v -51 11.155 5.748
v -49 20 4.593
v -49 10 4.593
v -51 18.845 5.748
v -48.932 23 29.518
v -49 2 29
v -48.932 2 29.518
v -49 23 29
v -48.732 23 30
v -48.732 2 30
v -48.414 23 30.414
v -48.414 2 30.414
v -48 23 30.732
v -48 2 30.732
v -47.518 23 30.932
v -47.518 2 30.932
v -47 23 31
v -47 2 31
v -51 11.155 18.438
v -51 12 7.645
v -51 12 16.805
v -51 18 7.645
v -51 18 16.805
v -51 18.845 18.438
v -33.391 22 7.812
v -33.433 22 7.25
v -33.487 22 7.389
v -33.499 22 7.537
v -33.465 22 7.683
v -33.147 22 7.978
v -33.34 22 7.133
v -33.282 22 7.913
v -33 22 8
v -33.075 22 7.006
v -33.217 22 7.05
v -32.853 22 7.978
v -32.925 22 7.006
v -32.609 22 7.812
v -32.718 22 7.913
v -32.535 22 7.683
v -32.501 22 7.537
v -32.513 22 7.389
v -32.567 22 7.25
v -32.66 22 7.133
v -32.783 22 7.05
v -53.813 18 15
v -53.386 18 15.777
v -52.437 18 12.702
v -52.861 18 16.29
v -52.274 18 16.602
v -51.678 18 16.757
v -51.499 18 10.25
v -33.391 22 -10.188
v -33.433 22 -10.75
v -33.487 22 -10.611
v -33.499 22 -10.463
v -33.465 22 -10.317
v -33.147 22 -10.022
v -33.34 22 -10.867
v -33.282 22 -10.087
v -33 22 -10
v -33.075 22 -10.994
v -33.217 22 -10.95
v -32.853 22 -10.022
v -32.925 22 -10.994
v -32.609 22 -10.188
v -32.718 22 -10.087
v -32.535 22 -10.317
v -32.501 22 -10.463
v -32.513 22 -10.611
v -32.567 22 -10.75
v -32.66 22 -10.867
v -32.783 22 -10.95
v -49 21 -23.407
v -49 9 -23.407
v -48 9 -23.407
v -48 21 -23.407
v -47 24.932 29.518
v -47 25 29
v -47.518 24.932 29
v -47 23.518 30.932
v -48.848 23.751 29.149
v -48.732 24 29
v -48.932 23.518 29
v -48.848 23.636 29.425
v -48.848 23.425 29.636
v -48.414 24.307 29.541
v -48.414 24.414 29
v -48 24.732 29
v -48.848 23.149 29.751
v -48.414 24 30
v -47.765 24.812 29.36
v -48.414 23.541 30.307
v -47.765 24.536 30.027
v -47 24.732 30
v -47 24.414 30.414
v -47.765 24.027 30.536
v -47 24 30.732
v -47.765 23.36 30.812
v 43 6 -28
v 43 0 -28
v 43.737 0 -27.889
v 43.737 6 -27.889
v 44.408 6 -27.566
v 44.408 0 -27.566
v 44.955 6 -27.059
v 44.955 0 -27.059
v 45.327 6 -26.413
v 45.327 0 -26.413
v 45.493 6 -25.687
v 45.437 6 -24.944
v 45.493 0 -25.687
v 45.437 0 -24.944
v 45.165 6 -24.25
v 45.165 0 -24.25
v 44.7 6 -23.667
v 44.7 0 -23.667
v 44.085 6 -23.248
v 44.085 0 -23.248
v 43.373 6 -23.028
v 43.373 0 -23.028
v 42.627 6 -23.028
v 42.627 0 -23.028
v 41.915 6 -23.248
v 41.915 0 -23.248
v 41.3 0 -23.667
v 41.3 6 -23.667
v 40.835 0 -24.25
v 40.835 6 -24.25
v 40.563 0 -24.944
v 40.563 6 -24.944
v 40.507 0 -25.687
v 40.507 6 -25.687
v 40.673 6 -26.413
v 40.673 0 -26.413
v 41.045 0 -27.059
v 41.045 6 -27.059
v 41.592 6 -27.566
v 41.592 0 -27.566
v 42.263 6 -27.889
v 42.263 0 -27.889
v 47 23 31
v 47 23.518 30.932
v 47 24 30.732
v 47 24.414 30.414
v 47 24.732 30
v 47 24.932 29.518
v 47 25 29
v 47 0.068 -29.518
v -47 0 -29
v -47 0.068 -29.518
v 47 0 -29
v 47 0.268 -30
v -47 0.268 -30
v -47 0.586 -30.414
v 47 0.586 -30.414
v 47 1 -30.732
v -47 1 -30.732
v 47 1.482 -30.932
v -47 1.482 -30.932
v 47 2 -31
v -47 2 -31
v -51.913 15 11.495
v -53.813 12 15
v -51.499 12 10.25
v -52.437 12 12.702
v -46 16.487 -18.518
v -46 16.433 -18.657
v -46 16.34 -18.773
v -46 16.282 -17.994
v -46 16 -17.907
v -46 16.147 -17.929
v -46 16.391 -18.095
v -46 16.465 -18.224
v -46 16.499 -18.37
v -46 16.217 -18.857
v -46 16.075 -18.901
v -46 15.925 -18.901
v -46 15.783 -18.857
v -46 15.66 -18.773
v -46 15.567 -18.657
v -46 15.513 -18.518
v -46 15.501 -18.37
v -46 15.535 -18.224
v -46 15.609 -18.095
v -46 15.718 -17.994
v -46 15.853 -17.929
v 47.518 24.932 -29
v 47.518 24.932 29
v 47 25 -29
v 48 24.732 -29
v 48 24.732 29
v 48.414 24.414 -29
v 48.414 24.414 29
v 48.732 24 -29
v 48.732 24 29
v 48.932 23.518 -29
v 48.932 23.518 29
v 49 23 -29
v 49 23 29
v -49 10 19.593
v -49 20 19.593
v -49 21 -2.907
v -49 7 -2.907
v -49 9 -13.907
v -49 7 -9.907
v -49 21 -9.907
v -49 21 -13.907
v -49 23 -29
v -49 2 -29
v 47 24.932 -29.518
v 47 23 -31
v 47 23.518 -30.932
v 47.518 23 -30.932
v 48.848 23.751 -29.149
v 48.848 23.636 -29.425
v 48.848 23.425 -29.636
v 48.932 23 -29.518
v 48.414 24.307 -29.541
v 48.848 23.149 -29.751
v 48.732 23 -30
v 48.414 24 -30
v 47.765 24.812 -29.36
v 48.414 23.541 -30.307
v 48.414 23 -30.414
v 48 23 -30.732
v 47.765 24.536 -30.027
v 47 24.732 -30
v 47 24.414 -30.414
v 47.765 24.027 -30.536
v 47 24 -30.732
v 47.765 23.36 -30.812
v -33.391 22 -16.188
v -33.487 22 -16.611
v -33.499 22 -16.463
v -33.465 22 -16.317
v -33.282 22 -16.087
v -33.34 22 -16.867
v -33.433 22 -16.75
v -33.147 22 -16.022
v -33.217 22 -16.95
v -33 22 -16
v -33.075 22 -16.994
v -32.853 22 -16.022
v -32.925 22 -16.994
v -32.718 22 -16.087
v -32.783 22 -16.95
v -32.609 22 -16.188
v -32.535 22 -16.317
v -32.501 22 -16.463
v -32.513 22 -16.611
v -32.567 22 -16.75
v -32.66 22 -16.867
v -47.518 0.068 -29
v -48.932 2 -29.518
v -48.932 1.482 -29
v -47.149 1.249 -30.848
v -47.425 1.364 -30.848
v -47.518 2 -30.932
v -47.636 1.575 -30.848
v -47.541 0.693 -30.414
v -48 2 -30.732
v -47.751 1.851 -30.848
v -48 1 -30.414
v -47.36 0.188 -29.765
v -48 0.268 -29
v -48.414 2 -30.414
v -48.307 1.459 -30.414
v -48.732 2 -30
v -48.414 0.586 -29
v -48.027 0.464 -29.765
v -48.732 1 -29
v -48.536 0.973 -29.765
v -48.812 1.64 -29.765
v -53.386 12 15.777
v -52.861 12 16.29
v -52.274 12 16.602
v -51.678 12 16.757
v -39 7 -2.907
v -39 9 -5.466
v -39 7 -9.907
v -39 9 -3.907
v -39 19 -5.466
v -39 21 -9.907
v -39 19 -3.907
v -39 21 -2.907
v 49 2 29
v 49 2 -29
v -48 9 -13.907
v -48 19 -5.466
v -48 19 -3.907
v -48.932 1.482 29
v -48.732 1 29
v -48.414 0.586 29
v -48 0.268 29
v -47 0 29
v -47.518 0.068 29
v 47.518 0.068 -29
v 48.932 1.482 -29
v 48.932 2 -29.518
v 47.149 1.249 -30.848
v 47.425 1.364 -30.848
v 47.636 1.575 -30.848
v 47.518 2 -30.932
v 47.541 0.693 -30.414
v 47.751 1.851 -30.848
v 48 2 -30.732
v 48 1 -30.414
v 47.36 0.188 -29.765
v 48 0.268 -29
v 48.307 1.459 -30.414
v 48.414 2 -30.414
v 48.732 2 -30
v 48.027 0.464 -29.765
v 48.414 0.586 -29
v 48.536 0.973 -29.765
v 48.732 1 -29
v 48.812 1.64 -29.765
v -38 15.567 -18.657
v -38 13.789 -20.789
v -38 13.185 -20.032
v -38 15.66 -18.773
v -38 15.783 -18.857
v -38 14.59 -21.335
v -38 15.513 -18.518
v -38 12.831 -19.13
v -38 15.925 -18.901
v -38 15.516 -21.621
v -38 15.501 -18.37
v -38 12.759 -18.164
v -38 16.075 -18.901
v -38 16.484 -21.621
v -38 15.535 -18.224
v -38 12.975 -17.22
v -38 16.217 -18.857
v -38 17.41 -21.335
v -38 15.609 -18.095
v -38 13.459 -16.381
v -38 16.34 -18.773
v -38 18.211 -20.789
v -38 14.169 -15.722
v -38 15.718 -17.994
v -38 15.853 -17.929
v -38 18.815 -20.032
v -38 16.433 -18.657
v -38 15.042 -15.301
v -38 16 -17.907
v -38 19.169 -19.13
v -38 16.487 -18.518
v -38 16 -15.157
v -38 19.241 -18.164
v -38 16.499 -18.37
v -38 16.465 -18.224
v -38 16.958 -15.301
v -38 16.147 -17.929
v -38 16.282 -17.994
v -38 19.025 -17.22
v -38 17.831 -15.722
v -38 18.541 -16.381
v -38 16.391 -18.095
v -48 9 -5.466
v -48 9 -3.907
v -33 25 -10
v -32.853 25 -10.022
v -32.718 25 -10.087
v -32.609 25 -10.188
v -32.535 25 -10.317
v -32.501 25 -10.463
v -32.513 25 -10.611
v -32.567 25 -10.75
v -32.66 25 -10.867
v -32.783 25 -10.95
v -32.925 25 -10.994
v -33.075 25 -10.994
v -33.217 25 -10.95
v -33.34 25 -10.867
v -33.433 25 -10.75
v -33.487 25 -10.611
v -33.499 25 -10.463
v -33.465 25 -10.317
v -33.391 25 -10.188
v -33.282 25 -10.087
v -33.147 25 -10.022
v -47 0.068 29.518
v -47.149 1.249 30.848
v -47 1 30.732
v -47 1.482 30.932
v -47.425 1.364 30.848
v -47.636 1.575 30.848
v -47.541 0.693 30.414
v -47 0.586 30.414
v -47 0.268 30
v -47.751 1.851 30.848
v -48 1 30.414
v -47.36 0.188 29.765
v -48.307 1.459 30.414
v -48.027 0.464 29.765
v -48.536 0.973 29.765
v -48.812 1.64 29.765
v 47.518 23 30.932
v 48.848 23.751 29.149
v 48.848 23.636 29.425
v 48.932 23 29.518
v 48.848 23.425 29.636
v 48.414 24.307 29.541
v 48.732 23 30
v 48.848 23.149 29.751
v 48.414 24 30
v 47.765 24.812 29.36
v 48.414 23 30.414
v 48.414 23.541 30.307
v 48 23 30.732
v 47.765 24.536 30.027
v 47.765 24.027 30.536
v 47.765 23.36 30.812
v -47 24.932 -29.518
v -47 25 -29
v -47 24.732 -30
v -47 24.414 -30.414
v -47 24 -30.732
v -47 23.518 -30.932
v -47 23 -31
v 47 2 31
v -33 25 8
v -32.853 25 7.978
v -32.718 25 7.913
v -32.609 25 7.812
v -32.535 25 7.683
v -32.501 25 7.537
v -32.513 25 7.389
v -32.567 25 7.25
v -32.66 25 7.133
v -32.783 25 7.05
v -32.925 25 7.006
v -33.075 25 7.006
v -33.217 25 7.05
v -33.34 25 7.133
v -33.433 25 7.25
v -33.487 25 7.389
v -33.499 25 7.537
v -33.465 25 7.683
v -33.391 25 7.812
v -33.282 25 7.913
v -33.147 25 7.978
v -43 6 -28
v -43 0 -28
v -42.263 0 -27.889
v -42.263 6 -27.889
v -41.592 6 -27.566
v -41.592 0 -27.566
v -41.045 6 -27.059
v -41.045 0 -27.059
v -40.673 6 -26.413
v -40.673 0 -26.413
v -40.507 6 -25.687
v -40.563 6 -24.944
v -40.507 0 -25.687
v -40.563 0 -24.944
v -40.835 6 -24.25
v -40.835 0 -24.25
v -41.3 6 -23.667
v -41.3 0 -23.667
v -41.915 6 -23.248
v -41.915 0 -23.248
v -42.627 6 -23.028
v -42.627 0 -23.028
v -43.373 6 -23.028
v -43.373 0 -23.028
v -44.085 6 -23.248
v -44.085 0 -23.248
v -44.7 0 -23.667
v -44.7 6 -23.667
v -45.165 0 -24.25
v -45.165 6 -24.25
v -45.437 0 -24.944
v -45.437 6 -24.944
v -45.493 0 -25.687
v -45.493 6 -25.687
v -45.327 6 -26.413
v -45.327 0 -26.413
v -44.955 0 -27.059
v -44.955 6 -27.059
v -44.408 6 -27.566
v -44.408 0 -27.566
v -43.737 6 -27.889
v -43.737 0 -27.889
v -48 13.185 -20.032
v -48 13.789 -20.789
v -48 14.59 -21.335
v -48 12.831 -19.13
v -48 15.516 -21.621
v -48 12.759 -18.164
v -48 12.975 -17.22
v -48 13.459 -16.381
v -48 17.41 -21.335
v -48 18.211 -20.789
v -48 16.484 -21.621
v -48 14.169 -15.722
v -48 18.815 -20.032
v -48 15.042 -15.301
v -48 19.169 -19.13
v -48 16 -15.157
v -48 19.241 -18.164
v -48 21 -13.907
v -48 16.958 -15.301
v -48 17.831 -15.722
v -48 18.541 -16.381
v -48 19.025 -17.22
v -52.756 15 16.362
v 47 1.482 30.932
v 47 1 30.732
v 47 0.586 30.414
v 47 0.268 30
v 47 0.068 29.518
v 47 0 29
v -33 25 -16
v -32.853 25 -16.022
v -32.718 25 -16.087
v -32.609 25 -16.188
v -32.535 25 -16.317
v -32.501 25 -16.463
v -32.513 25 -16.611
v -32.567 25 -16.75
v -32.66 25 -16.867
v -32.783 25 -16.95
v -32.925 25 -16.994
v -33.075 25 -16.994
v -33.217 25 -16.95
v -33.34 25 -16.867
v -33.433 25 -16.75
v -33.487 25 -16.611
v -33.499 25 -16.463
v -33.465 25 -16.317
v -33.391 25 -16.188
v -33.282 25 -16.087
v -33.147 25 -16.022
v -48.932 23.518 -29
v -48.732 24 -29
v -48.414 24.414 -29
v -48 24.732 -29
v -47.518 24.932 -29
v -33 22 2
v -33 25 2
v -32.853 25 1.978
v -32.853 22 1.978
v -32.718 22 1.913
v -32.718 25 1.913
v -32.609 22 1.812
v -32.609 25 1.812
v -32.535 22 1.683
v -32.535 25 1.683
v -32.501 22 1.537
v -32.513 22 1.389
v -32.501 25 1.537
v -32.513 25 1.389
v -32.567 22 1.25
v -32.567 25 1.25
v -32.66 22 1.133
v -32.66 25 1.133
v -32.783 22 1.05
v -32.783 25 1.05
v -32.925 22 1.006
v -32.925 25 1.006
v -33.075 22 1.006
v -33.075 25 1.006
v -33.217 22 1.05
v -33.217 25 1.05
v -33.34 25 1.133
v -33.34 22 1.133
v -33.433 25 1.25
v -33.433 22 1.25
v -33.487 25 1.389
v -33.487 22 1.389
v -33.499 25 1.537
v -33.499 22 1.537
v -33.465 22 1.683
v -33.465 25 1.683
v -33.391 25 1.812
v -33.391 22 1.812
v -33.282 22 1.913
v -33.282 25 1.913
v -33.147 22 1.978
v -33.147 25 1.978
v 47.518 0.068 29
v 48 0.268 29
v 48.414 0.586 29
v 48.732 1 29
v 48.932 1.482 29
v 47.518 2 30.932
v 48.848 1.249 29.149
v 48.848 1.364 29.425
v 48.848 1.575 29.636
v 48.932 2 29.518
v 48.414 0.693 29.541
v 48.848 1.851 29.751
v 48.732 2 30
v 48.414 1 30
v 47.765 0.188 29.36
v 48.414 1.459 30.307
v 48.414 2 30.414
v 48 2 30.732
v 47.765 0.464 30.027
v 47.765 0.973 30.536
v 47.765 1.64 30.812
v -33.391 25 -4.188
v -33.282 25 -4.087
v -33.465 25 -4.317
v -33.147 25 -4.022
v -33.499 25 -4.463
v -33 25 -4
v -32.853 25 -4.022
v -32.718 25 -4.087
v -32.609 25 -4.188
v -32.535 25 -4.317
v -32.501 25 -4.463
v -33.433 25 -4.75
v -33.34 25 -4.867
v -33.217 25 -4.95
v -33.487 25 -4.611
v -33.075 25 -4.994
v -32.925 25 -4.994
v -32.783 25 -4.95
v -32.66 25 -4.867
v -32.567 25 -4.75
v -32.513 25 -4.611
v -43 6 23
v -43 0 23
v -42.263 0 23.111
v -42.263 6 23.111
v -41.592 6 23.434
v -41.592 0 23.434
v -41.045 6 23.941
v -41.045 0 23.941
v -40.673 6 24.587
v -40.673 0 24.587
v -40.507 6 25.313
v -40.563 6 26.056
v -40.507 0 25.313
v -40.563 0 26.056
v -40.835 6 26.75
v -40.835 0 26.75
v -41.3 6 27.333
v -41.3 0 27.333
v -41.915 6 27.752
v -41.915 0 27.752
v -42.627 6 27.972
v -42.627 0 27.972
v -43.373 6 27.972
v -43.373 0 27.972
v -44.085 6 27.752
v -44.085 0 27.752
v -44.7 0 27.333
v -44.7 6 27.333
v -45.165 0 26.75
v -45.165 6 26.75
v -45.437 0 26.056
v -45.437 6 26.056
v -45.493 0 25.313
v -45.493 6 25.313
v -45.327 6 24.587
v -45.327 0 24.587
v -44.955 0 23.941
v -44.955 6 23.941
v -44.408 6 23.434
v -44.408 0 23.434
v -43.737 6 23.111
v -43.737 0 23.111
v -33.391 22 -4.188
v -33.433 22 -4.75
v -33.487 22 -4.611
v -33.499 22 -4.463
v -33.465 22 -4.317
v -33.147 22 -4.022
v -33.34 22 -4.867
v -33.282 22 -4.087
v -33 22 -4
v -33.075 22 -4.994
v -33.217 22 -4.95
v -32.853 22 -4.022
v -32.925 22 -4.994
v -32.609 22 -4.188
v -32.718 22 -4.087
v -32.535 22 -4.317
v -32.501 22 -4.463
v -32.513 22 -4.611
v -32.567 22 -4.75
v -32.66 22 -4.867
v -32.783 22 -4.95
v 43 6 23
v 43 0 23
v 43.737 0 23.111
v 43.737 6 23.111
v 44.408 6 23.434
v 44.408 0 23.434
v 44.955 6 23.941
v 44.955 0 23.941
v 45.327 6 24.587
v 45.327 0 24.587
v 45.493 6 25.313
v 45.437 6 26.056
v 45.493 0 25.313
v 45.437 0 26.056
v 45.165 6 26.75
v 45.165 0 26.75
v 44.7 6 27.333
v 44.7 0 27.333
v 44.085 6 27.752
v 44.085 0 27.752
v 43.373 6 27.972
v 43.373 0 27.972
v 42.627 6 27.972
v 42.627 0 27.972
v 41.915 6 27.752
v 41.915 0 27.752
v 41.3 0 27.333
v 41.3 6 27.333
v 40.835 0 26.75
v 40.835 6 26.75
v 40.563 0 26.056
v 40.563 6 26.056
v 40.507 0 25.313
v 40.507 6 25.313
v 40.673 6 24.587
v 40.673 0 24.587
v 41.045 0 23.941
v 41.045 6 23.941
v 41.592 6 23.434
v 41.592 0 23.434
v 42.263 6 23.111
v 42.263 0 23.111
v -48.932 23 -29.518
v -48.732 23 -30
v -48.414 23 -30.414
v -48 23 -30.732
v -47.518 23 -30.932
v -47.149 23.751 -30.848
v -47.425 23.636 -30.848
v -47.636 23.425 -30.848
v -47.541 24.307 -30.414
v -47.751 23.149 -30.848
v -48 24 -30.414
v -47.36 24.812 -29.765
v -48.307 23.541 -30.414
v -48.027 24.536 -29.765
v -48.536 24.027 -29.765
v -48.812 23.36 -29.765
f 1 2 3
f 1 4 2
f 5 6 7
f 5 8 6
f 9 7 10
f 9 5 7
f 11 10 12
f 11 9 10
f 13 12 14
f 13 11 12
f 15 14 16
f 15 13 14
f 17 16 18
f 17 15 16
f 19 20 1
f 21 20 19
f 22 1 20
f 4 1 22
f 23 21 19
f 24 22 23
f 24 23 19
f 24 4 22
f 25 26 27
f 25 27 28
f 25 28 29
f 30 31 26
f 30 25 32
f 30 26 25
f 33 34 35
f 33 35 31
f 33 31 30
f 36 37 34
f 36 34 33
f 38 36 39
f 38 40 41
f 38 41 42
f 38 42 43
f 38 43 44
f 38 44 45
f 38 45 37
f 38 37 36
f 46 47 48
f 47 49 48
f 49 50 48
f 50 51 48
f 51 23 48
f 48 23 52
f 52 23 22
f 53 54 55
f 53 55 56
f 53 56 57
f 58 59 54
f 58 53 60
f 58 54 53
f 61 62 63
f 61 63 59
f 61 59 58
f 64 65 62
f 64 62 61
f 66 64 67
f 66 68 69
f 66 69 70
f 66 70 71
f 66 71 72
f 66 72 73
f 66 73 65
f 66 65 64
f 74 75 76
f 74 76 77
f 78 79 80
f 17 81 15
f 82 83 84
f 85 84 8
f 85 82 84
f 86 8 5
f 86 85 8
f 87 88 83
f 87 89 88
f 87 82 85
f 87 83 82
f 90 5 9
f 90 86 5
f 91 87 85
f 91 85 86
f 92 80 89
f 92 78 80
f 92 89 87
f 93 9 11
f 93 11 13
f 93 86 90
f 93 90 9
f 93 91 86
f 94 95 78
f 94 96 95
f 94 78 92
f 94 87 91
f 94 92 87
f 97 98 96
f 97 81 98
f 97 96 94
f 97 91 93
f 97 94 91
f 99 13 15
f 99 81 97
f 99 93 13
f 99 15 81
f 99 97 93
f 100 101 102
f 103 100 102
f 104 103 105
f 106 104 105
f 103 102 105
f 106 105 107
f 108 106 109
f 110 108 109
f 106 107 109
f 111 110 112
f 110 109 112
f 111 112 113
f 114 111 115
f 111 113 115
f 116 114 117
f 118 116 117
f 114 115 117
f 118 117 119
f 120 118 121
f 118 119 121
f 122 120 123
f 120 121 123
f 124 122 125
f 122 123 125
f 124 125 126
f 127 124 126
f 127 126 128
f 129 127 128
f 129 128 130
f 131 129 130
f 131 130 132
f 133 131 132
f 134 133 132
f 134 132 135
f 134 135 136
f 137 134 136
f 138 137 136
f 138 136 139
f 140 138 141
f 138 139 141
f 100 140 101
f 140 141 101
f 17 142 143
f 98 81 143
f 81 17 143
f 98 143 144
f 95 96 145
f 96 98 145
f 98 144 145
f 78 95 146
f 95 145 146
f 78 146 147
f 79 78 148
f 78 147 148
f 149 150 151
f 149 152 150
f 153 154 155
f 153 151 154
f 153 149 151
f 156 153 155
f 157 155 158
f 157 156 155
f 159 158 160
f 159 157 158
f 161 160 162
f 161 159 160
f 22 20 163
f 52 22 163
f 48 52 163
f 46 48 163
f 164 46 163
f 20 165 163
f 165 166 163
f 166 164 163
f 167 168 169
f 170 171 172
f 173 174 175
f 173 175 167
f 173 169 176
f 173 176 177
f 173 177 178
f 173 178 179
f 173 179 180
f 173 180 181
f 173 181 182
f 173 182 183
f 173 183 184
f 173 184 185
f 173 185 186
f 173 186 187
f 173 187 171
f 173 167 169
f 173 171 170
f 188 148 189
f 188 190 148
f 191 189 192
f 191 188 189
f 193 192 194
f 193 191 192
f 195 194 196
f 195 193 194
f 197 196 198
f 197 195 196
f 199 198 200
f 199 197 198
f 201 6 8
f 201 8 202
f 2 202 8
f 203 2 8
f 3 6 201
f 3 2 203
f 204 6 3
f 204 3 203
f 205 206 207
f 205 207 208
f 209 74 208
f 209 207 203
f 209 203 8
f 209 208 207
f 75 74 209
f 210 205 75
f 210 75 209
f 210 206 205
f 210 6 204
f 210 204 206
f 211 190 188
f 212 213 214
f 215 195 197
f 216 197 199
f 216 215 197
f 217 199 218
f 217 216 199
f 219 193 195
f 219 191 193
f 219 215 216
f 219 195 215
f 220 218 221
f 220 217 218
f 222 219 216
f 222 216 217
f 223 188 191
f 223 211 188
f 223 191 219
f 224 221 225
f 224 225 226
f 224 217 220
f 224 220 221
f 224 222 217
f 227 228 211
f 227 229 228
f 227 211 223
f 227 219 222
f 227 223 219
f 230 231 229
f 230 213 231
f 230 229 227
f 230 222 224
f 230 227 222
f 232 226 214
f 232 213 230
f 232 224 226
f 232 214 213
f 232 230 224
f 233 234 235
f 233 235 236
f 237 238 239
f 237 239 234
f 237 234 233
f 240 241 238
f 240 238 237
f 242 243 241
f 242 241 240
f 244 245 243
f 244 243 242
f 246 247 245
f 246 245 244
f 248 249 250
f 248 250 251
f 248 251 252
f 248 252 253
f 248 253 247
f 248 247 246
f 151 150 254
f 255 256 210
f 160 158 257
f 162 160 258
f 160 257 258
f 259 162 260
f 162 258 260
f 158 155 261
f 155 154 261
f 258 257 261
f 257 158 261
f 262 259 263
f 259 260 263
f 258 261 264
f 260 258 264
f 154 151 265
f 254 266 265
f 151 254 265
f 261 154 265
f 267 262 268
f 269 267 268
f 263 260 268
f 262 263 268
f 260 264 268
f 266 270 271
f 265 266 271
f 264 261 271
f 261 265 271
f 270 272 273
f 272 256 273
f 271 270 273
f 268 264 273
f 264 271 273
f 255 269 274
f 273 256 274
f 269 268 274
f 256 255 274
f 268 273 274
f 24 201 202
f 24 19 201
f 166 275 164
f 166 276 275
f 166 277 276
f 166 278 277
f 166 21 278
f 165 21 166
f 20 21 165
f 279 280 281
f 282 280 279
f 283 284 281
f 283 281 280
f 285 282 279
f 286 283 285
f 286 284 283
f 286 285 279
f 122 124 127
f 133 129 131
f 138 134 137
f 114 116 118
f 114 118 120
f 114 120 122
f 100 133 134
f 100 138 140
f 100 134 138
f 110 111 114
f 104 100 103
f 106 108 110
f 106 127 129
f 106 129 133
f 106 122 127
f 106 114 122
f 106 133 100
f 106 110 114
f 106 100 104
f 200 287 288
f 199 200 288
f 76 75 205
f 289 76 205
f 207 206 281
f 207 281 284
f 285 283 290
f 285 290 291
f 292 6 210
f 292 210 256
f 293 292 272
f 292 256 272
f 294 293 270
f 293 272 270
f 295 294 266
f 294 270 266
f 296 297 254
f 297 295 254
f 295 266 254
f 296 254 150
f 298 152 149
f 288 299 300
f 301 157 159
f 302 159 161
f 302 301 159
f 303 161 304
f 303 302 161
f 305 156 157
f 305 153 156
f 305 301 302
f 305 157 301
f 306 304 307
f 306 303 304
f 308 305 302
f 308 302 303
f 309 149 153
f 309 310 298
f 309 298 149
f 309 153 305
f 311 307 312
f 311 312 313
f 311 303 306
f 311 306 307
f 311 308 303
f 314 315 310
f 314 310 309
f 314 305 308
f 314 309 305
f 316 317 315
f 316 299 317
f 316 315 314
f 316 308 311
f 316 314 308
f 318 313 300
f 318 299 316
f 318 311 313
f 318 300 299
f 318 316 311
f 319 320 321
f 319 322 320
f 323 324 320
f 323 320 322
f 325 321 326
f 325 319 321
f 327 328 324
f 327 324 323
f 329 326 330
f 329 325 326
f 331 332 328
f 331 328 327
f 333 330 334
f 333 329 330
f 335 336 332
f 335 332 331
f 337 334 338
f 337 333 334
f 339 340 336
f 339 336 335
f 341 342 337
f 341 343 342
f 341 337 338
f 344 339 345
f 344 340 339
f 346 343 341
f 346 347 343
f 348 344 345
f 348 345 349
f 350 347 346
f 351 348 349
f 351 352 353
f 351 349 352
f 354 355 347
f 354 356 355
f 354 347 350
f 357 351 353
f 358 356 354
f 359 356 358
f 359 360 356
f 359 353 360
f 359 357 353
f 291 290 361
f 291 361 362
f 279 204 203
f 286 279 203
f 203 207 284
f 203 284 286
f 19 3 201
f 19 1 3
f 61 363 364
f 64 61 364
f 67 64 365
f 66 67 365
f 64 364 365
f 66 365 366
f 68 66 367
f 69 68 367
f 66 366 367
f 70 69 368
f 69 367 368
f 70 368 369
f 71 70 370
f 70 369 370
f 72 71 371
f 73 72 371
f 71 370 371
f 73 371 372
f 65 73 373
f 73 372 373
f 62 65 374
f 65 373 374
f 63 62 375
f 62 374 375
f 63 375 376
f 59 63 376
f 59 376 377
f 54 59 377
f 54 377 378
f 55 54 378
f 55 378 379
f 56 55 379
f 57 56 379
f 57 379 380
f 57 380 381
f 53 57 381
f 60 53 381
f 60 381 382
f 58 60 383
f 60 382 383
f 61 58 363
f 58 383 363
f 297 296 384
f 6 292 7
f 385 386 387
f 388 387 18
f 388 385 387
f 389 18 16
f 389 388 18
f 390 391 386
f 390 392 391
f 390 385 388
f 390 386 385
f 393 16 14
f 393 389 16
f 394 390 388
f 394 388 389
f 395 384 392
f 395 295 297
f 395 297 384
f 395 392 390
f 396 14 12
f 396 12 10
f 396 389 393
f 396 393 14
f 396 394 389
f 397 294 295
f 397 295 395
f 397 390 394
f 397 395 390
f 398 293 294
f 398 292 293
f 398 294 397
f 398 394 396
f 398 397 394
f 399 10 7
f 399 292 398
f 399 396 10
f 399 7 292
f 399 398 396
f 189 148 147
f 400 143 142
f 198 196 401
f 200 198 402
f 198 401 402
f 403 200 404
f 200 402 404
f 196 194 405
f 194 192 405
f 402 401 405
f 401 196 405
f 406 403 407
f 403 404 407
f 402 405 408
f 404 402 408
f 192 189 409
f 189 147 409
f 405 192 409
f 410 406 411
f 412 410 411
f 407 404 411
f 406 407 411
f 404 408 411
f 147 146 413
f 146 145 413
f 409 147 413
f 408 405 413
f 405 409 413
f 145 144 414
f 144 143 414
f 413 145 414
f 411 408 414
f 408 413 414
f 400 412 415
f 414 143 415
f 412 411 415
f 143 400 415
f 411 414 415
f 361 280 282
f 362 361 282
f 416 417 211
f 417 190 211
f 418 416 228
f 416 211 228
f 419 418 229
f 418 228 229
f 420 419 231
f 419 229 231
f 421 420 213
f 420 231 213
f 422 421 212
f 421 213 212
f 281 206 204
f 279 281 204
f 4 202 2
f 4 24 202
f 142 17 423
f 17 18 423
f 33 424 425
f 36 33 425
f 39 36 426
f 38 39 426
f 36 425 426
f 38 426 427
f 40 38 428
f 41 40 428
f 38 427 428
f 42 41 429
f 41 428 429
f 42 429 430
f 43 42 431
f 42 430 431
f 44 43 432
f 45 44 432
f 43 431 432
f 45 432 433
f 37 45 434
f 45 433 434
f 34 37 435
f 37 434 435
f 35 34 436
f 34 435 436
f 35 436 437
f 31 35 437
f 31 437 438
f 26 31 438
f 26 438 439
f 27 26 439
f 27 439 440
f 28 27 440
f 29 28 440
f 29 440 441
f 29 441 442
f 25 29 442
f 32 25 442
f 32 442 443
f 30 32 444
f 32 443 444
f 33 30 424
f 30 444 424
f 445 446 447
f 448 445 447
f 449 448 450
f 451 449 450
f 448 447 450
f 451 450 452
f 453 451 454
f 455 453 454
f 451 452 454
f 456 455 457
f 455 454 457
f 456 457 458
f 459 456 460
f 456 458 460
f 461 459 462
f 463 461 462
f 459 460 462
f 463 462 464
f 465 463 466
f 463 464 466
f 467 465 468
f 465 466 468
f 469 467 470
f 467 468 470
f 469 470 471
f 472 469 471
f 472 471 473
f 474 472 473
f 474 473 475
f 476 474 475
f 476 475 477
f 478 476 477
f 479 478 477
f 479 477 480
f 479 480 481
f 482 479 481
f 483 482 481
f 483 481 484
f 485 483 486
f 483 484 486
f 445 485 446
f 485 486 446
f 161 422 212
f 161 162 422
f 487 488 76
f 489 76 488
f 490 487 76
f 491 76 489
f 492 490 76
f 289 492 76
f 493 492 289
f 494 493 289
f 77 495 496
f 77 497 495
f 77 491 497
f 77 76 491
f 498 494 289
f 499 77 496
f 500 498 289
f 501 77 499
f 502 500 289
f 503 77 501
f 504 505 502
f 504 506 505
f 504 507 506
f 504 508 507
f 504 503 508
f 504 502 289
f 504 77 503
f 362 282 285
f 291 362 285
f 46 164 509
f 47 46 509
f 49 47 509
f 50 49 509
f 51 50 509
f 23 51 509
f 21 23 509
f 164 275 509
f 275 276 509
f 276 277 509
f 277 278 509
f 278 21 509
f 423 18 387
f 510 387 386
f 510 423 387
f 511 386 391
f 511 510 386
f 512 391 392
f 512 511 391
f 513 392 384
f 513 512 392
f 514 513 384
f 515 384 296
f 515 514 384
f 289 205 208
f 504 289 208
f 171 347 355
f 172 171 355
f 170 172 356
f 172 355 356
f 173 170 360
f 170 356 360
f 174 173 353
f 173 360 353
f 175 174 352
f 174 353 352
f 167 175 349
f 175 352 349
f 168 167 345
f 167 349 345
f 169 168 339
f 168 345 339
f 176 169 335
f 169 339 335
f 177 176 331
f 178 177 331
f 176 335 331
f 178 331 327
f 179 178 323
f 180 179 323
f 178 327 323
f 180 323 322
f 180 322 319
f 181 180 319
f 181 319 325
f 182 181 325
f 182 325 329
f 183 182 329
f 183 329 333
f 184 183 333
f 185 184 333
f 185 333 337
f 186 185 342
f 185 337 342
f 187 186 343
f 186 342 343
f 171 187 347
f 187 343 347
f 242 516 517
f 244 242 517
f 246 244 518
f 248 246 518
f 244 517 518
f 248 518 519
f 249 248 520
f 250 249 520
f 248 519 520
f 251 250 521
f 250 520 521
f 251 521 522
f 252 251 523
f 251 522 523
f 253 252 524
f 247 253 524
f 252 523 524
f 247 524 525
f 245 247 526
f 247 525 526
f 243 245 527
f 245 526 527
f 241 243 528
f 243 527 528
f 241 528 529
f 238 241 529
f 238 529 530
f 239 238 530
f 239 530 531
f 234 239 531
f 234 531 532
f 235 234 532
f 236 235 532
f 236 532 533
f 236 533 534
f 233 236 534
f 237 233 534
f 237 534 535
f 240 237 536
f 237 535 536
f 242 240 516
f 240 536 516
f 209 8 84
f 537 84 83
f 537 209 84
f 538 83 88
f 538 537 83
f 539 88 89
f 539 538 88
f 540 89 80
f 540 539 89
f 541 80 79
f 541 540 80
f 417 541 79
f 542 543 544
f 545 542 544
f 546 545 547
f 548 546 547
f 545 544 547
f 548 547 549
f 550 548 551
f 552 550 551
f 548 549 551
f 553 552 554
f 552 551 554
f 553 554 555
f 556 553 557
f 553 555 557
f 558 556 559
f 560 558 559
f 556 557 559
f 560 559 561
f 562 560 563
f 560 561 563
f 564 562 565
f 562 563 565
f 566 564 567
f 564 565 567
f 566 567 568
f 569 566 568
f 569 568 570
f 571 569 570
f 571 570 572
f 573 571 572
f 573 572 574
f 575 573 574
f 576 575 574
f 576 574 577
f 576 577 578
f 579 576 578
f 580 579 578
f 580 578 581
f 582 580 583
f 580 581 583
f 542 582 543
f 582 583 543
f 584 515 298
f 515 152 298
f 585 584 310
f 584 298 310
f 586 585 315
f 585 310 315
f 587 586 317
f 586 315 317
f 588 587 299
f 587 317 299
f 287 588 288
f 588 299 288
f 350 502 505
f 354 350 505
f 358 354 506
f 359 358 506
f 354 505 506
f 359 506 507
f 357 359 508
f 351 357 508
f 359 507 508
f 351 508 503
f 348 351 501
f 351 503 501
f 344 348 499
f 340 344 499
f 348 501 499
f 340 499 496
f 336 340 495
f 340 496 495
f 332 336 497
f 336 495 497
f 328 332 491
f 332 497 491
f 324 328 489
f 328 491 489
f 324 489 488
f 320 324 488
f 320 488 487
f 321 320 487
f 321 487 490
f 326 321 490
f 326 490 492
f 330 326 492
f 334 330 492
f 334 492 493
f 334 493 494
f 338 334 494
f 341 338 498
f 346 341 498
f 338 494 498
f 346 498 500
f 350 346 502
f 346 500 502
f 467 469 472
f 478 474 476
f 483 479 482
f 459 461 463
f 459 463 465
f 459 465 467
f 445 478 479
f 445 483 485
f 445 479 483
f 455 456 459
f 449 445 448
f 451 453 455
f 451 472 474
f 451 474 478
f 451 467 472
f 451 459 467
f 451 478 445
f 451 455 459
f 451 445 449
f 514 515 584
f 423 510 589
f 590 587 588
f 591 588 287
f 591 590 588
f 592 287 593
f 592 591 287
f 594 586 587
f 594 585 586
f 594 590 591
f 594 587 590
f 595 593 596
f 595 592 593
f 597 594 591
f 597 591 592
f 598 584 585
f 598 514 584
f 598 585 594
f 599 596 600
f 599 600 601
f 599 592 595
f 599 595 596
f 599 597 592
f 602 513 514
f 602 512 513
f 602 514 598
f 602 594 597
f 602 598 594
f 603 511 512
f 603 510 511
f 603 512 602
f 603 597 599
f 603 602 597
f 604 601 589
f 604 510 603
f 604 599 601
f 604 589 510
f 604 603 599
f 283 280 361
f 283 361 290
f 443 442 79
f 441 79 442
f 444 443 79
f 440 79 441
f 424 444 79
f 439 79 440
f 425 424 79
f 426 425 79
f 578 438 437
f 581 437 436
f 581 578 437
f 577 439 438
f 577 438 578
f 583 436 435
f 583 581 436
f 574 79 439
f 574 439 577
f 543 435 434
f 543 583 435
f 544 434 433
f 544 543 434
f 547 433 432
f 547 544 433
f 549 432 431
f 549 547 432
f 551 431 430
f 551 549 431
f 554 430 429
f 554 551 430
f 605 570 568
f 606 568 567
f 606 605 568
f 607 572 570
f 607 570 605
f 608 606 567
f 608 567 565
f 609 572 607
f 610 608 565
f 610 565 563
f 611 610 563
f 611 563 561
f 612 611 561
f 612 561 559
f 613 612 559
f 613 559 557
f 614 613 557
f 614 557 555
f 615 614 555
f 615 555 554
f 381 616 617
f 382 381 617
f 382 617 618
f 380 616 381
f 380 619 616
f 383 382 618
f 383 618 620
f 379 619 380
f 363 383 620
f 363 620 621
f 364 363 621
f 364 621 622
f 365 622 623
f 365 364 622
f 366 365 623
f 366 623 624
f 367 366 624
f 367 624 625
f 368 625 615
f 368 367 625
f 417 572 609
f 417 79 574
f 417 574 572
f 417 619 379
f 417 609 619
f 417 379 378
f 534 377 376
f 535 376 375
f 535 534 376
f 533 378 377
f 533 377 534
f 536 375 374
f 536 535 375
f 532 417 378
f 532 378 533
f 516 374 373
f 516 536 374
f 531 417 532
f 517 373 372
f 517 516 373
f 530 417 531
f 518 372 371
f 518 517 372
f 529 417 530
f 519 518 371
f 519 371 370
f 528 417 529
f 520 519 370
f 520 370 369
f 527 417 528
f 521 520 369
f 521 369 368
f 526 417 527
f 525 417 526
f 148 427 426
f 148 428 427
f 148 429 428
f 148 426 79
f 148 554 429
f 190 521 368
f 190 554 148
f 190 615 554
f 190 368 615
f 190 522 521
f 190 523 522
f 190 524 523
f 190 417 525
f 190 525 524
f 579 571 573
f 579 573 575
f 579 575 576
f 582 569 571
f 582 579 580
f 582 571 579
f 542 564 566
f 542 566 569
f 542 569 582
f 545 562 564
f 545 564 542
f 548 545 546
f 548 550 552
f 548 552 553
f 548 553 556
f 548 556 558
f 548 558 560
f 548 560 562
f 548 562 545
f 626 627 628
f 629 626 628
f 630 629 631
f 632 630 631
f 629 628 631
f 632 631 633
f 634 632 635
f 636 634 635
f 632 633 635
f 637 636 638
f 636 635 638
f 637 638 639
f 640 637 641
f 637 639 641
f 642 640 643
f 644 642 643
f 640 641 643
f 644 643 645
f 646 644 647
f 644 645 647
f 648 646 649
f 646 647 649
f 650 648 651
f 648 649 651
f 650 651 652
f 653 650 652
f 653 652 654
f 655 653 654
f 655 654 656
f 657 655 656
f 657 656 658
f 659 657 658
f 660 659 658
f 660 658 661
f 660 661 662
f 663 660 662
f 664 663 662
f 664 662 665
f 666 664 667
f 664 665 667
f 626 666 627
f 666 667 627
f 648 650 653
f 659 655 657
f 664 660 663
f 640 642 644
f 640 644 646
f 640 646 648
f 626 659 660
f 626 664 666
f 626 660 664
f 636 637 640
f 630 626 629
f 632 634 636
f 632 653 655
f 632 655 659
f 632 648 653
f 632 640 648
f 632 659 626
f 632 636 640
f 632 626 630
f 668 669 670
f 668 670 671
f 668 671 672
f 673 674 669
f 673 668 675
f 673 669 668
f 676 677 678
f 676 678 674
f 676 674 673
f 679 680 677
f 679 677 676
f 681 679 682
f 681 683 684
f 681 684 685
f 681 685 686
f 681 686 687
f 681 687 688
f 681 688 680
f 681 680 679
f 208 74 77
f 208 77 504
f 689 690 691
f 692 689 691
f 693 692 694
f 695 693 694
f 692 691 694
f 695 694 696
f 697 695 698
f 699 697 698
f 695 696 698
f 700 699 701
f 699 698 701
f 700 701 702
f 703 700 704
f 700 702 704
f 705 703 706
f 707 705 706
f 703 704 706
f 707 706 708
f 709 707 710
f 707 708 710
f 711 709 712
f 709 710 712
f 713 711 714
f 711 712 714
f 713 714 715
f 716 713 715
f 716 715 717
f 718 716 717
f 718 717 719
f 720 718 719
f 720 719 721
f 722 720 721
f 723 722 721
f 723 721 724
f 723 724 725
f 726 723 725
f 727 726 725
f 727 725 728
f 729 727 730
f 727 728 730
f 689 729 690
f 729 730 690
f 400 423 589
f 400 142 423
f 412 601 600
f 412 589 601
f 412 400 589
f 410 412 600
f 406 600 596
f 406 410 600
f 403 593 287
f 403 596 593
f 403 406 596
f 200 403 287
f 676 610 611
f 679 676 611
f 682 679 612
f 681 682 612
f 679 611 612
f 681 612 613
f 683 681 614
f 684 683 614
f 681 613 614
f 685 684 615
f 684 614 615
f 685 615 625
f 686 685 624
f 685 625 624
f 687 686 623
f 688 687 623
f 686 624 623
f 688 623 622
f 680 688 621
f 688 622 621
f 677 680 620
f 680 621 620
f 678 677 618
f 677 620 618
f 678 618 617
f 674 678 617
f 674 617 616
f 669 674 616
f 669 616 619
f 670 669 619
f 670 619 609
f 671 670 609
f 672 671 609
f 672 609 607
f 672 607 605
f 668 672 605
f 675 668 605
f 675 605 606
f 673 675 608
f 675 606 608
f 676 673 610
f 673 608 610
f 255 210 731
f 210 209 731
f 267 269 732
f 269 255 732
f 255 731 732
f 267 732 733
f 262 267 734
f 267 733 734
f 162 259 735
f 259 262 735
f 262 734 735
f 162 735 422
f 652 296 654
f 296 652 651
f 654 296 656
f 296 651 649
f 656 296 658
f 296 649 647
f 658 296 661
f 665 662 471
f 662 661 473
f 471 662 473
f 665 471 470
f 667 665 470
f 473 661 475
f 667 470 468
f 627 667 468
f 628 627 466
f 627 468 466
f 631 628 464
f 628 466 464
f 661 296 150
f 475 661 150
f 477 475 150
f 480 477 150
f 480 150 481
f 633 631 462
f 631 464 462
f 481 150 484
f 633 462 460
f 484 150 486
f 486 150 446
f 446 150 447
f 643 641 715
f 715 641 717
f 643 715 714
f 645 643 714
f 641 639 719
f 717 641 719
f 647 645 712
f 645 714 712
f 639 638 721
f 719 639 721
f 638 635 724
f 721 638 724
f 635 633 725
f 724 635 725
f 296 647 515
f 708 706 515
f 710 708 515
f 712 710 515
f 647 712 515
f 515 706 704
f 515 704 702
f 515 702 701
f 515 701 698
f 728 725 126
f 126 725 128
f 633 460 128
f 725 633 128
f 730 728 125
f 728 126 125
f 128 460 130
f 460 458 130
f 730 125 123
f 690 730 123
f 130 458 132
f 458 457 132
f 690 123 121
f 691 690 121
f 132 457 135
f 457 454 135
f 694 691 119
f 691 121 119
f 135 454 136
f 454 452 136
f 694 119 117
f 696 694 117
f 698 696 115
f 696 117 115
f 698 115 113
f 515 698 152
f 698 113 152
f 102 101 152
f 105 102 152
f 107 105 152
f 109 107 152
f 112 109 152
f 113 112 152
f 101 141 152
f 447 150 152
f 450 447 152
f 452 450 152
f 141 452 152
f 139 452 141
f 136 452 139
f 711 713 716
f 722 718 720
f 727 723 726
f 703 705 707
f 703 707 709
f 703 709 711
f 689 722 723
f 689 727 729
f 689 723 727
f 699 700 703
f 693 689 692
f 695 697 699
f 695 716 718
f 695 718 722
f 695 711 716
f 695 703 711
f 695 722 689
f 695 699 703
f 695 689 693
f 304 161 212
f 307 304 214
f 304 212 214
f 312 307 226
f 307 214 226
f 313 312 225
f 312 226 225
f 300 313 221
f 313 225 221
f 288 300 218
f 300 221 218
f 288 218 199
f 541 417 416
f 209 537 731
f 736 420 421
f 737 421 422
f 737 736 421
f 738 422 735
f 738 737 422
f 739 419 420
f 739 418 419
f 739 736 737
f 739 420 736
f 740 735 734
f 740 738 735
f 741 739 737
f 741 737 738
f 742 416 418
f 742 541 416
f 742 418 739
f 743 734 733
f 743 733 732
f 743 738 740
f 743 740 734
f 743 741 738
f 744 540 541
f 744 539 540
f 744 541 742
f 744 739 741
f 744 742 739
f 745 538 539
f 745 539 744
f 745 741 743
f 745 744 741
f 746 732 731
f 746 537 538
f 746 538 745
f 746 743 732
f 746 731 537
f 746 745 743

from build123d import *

# Parameters (mm, degrees)
SKETCH2_W           = 98
SKETCH2_H           = 62
BOSS_EXTRUDE1_DEPTH = 25
SKETCH3_W           = 9.5
SKETCH3_H           = 12
BOSS_EXTRUDE4_DEPTH = 1
SKETCH3_5_W         = 9.5
SKETCH3_5_H         = 12
CUT_EXTRUDE1_DEPTH  = 1
SKETCH4_R           = 3.25
CUT_EXTRUDE2_DEPTH  = 10
SKETCH5_R           = 0.5
BOSS_EXTRUDE5_DEPTH = 8
SKETCH6_W           = 7
SKETCH6_H           = 14
CUT_EXTRUDE9_DEPTH  = 10
SKETCH7_W           = 1.559437484
SKETCH7_H           = 10
BOSS_EXTRUDE6_DEPTH = 9
SKETCH8_W           = 15
SKETCH8_H           = 10
BOSS_EXTRUDE7_DEPTH = 2
BOSS_EXTRUDE7_TAPER = 30
BOSS_EXTRUDE8_DEPTH = 6
FILLET5_R           = 2
SKETCH10_R          = 2.5
CUT_EXTRUDE10_DEPTH = 6
SKETCH11_R          = 0.5
CUT_EXTRUDE11_DEPTH = 3


with BuildPart() as part:
    # Sketch2 → Boss-Extrude1 (new body)
    with BuildSketch(Plane(origin=(0, 0, 0), x_dir=(1, 0, 0), z_dir=(0, 1, 0))):
        Rectangle(SKETCH2_W, SKETCH2_H)
    extrude(amount=BOSS_EXTRUDE1_DEPTH)

    # Sketch3 → Boss-Extrude4 (add)
    with BuildSketch(Plane.ZY.offset(49)):
        with Locations((-18.656971736, 15)):
            Rectangle(SKETCH3_W, SKETCH3_H)
    extrude(amount=-BOSS_EXTRUDE4_DEPTH)

    # Sketch3<5> → Cut-Extrude1 (cut)
    with BuildSketch(Plane.ZY.offset(49)):
        with Locations((-18.656971736, 15)):
            Rectangle(SKETCH3_5_W, SKETCH3_5_H)
    extrude(amount=-CUT_EXTRUDE1_DEPTH, mode=Mode.SUBTRACT)

    # Sketch4 → Cut-Extrude2 (cut)
    with BuildSketch(Plane.ZY.offset(48)):
        with Locations((-18.406971736, 16)):
            Circle(SKETCH4_R)
    extrude(amount=-CUT_EXTRUDE2_DEPTH, mode=Mode.SUBTRACT)

    # Sketch5 → Boss-Extrude5 (add)
    with BuildSketch(Plane.ZY.offset(38)):
        with Locations((-18.406971736, 16)):
            Circle(SKETCH5_R)
    extrude(amount=BOSS_EXTRUDE5_DEPTH)

    # Sketch6 → Cut-Extrude9 (cut)
    with BuildSketch(Plane.ZY.offset(49)):
        with Locations((-6.406971736, 14)):
            Rectangle(SKETCH6_W, SKETCH6_H)
    extrude(amount=-CUT_EXTRUDE9_DEPTH, mode=Mode.SUBTRACT)

    # Sketch7 → Boss-Extrude6 (add)
    with BuildSketch(Plane.ZY.offset(39)):
        with Locations((-4.686690478, 14)):
            Rectangle(SKETCH7_W, SKETCH7_H)
    extrude(amount=BOSS_EXTRUDE6_DEPTH)

    # Sketch8 → Boss-Extrude7 (add)
    with BuildSketch(Plane.ZY.offset(49)):
        with Locations((12.093028264, 15)):
            Rectangle(SKETCH8_W, SKETCH8_H)
    extrude(amount=BOSS_EXTRUDE7_DEPTH, taper=BOSS_EXTRUDE7_TAPER)

    # Sketch9 → Boss-Extrude8 (add)
    with BuildSketch(Plane(origin=(0, 12, 0), x_dir=(-1, 0, 0), z_dir=(0, -1, 0))):
        with BuildLine():
            Line((51, -7.644654734), (51, -16.805465041))
            add(Edge.make_bspline(
                [(53.813384295, -15.000246539), (53.104445278, -16.821688465), (51, -16.805465041)],
                knots=[0, 0, 0, 1, 1, 1], degree=2))
            add(Edge.make_bspline(
                [(51, -7.644654734), (51.419023322, -11.667929153), (53.813384295, -15.000246539)],
                knots=[0, 0, 0, 1, 1, 1], degree=2))
        make_face()
    extrude(amount=-BOSS_EXTRUDE8_DEPTH)

    # Fillet5
    fillet5_edges = [part.edges().sort_by_distance(p)[0] for p in [
        (0, 25, 31),
        (-49, 25, 0),
        (0, 25, -31),
        (-49, 0, 0),
        (0, 0, 31),
        (49, 0, 0),
        (0, 0, -31),
        (49, 25, 0),
        (-49, 12.5, -31),
        (-49, 12.5, 31),
        (49, 12.5, 31),
        (49, 12.5, -31),
    ]]
    fillet(fillet5_edges, radius=FILLET5_R)

    # Sketch10 → Cut-Extrude10 (cut)
    with BuildSketch(Plane.XZ):
        with Locations(Location((-43, -25.5, 0), (0, 0, 270))):
            Circle(SKETCH10_R)
        with Locations(Location((-43, 25.5, 0), (0, 0, 270))):
            Circle(SKETCH10_R)
        with Locations(Location((43, 25.5, 0), (0, 0, 270))):
            Circle(SKETCH10_R)
        with Locations(Location((43, -25.5, 0), (0, 0, 270))):
            Circle(SKETCH10_R)
    extrude(amount=-CUT_EXTRUDE10_DEPTH, mode=Mode.SUBTRACT)

    # Sketch11 → Cut-Extrude11 (cut)
    with BuildSketch(Plane(origin=(0, 25, 0), x_dir=(1, 0, 0), z_dir=(0, 1, 0))):
        with Locations(Location((-33, 16.5, 0), (0, 0, 270))):
            Circle(SKETCH11_R)
        with Locations(Location((-33, 10.5, 0), (0, 0, 270))):
            Circle(SKETCH11_R)
        with Locations(Location((-33, 4.5, 0), (0, 0, 270))):
            Circle(SKETCH11_R)
        with Locations(Location((-33, -1.5, 0), (0, 0, 270))):
            Circle(SKETCH11_R)
        with Locations(Location((-33, -7.5, 0), (0, 0, 270))):
            Circle(SKETCH11_R)
    extrude(amount=-CUT_EXTRUDE11_DEPTH, mode=Mode.SUBTRACT)


solid = part.part
